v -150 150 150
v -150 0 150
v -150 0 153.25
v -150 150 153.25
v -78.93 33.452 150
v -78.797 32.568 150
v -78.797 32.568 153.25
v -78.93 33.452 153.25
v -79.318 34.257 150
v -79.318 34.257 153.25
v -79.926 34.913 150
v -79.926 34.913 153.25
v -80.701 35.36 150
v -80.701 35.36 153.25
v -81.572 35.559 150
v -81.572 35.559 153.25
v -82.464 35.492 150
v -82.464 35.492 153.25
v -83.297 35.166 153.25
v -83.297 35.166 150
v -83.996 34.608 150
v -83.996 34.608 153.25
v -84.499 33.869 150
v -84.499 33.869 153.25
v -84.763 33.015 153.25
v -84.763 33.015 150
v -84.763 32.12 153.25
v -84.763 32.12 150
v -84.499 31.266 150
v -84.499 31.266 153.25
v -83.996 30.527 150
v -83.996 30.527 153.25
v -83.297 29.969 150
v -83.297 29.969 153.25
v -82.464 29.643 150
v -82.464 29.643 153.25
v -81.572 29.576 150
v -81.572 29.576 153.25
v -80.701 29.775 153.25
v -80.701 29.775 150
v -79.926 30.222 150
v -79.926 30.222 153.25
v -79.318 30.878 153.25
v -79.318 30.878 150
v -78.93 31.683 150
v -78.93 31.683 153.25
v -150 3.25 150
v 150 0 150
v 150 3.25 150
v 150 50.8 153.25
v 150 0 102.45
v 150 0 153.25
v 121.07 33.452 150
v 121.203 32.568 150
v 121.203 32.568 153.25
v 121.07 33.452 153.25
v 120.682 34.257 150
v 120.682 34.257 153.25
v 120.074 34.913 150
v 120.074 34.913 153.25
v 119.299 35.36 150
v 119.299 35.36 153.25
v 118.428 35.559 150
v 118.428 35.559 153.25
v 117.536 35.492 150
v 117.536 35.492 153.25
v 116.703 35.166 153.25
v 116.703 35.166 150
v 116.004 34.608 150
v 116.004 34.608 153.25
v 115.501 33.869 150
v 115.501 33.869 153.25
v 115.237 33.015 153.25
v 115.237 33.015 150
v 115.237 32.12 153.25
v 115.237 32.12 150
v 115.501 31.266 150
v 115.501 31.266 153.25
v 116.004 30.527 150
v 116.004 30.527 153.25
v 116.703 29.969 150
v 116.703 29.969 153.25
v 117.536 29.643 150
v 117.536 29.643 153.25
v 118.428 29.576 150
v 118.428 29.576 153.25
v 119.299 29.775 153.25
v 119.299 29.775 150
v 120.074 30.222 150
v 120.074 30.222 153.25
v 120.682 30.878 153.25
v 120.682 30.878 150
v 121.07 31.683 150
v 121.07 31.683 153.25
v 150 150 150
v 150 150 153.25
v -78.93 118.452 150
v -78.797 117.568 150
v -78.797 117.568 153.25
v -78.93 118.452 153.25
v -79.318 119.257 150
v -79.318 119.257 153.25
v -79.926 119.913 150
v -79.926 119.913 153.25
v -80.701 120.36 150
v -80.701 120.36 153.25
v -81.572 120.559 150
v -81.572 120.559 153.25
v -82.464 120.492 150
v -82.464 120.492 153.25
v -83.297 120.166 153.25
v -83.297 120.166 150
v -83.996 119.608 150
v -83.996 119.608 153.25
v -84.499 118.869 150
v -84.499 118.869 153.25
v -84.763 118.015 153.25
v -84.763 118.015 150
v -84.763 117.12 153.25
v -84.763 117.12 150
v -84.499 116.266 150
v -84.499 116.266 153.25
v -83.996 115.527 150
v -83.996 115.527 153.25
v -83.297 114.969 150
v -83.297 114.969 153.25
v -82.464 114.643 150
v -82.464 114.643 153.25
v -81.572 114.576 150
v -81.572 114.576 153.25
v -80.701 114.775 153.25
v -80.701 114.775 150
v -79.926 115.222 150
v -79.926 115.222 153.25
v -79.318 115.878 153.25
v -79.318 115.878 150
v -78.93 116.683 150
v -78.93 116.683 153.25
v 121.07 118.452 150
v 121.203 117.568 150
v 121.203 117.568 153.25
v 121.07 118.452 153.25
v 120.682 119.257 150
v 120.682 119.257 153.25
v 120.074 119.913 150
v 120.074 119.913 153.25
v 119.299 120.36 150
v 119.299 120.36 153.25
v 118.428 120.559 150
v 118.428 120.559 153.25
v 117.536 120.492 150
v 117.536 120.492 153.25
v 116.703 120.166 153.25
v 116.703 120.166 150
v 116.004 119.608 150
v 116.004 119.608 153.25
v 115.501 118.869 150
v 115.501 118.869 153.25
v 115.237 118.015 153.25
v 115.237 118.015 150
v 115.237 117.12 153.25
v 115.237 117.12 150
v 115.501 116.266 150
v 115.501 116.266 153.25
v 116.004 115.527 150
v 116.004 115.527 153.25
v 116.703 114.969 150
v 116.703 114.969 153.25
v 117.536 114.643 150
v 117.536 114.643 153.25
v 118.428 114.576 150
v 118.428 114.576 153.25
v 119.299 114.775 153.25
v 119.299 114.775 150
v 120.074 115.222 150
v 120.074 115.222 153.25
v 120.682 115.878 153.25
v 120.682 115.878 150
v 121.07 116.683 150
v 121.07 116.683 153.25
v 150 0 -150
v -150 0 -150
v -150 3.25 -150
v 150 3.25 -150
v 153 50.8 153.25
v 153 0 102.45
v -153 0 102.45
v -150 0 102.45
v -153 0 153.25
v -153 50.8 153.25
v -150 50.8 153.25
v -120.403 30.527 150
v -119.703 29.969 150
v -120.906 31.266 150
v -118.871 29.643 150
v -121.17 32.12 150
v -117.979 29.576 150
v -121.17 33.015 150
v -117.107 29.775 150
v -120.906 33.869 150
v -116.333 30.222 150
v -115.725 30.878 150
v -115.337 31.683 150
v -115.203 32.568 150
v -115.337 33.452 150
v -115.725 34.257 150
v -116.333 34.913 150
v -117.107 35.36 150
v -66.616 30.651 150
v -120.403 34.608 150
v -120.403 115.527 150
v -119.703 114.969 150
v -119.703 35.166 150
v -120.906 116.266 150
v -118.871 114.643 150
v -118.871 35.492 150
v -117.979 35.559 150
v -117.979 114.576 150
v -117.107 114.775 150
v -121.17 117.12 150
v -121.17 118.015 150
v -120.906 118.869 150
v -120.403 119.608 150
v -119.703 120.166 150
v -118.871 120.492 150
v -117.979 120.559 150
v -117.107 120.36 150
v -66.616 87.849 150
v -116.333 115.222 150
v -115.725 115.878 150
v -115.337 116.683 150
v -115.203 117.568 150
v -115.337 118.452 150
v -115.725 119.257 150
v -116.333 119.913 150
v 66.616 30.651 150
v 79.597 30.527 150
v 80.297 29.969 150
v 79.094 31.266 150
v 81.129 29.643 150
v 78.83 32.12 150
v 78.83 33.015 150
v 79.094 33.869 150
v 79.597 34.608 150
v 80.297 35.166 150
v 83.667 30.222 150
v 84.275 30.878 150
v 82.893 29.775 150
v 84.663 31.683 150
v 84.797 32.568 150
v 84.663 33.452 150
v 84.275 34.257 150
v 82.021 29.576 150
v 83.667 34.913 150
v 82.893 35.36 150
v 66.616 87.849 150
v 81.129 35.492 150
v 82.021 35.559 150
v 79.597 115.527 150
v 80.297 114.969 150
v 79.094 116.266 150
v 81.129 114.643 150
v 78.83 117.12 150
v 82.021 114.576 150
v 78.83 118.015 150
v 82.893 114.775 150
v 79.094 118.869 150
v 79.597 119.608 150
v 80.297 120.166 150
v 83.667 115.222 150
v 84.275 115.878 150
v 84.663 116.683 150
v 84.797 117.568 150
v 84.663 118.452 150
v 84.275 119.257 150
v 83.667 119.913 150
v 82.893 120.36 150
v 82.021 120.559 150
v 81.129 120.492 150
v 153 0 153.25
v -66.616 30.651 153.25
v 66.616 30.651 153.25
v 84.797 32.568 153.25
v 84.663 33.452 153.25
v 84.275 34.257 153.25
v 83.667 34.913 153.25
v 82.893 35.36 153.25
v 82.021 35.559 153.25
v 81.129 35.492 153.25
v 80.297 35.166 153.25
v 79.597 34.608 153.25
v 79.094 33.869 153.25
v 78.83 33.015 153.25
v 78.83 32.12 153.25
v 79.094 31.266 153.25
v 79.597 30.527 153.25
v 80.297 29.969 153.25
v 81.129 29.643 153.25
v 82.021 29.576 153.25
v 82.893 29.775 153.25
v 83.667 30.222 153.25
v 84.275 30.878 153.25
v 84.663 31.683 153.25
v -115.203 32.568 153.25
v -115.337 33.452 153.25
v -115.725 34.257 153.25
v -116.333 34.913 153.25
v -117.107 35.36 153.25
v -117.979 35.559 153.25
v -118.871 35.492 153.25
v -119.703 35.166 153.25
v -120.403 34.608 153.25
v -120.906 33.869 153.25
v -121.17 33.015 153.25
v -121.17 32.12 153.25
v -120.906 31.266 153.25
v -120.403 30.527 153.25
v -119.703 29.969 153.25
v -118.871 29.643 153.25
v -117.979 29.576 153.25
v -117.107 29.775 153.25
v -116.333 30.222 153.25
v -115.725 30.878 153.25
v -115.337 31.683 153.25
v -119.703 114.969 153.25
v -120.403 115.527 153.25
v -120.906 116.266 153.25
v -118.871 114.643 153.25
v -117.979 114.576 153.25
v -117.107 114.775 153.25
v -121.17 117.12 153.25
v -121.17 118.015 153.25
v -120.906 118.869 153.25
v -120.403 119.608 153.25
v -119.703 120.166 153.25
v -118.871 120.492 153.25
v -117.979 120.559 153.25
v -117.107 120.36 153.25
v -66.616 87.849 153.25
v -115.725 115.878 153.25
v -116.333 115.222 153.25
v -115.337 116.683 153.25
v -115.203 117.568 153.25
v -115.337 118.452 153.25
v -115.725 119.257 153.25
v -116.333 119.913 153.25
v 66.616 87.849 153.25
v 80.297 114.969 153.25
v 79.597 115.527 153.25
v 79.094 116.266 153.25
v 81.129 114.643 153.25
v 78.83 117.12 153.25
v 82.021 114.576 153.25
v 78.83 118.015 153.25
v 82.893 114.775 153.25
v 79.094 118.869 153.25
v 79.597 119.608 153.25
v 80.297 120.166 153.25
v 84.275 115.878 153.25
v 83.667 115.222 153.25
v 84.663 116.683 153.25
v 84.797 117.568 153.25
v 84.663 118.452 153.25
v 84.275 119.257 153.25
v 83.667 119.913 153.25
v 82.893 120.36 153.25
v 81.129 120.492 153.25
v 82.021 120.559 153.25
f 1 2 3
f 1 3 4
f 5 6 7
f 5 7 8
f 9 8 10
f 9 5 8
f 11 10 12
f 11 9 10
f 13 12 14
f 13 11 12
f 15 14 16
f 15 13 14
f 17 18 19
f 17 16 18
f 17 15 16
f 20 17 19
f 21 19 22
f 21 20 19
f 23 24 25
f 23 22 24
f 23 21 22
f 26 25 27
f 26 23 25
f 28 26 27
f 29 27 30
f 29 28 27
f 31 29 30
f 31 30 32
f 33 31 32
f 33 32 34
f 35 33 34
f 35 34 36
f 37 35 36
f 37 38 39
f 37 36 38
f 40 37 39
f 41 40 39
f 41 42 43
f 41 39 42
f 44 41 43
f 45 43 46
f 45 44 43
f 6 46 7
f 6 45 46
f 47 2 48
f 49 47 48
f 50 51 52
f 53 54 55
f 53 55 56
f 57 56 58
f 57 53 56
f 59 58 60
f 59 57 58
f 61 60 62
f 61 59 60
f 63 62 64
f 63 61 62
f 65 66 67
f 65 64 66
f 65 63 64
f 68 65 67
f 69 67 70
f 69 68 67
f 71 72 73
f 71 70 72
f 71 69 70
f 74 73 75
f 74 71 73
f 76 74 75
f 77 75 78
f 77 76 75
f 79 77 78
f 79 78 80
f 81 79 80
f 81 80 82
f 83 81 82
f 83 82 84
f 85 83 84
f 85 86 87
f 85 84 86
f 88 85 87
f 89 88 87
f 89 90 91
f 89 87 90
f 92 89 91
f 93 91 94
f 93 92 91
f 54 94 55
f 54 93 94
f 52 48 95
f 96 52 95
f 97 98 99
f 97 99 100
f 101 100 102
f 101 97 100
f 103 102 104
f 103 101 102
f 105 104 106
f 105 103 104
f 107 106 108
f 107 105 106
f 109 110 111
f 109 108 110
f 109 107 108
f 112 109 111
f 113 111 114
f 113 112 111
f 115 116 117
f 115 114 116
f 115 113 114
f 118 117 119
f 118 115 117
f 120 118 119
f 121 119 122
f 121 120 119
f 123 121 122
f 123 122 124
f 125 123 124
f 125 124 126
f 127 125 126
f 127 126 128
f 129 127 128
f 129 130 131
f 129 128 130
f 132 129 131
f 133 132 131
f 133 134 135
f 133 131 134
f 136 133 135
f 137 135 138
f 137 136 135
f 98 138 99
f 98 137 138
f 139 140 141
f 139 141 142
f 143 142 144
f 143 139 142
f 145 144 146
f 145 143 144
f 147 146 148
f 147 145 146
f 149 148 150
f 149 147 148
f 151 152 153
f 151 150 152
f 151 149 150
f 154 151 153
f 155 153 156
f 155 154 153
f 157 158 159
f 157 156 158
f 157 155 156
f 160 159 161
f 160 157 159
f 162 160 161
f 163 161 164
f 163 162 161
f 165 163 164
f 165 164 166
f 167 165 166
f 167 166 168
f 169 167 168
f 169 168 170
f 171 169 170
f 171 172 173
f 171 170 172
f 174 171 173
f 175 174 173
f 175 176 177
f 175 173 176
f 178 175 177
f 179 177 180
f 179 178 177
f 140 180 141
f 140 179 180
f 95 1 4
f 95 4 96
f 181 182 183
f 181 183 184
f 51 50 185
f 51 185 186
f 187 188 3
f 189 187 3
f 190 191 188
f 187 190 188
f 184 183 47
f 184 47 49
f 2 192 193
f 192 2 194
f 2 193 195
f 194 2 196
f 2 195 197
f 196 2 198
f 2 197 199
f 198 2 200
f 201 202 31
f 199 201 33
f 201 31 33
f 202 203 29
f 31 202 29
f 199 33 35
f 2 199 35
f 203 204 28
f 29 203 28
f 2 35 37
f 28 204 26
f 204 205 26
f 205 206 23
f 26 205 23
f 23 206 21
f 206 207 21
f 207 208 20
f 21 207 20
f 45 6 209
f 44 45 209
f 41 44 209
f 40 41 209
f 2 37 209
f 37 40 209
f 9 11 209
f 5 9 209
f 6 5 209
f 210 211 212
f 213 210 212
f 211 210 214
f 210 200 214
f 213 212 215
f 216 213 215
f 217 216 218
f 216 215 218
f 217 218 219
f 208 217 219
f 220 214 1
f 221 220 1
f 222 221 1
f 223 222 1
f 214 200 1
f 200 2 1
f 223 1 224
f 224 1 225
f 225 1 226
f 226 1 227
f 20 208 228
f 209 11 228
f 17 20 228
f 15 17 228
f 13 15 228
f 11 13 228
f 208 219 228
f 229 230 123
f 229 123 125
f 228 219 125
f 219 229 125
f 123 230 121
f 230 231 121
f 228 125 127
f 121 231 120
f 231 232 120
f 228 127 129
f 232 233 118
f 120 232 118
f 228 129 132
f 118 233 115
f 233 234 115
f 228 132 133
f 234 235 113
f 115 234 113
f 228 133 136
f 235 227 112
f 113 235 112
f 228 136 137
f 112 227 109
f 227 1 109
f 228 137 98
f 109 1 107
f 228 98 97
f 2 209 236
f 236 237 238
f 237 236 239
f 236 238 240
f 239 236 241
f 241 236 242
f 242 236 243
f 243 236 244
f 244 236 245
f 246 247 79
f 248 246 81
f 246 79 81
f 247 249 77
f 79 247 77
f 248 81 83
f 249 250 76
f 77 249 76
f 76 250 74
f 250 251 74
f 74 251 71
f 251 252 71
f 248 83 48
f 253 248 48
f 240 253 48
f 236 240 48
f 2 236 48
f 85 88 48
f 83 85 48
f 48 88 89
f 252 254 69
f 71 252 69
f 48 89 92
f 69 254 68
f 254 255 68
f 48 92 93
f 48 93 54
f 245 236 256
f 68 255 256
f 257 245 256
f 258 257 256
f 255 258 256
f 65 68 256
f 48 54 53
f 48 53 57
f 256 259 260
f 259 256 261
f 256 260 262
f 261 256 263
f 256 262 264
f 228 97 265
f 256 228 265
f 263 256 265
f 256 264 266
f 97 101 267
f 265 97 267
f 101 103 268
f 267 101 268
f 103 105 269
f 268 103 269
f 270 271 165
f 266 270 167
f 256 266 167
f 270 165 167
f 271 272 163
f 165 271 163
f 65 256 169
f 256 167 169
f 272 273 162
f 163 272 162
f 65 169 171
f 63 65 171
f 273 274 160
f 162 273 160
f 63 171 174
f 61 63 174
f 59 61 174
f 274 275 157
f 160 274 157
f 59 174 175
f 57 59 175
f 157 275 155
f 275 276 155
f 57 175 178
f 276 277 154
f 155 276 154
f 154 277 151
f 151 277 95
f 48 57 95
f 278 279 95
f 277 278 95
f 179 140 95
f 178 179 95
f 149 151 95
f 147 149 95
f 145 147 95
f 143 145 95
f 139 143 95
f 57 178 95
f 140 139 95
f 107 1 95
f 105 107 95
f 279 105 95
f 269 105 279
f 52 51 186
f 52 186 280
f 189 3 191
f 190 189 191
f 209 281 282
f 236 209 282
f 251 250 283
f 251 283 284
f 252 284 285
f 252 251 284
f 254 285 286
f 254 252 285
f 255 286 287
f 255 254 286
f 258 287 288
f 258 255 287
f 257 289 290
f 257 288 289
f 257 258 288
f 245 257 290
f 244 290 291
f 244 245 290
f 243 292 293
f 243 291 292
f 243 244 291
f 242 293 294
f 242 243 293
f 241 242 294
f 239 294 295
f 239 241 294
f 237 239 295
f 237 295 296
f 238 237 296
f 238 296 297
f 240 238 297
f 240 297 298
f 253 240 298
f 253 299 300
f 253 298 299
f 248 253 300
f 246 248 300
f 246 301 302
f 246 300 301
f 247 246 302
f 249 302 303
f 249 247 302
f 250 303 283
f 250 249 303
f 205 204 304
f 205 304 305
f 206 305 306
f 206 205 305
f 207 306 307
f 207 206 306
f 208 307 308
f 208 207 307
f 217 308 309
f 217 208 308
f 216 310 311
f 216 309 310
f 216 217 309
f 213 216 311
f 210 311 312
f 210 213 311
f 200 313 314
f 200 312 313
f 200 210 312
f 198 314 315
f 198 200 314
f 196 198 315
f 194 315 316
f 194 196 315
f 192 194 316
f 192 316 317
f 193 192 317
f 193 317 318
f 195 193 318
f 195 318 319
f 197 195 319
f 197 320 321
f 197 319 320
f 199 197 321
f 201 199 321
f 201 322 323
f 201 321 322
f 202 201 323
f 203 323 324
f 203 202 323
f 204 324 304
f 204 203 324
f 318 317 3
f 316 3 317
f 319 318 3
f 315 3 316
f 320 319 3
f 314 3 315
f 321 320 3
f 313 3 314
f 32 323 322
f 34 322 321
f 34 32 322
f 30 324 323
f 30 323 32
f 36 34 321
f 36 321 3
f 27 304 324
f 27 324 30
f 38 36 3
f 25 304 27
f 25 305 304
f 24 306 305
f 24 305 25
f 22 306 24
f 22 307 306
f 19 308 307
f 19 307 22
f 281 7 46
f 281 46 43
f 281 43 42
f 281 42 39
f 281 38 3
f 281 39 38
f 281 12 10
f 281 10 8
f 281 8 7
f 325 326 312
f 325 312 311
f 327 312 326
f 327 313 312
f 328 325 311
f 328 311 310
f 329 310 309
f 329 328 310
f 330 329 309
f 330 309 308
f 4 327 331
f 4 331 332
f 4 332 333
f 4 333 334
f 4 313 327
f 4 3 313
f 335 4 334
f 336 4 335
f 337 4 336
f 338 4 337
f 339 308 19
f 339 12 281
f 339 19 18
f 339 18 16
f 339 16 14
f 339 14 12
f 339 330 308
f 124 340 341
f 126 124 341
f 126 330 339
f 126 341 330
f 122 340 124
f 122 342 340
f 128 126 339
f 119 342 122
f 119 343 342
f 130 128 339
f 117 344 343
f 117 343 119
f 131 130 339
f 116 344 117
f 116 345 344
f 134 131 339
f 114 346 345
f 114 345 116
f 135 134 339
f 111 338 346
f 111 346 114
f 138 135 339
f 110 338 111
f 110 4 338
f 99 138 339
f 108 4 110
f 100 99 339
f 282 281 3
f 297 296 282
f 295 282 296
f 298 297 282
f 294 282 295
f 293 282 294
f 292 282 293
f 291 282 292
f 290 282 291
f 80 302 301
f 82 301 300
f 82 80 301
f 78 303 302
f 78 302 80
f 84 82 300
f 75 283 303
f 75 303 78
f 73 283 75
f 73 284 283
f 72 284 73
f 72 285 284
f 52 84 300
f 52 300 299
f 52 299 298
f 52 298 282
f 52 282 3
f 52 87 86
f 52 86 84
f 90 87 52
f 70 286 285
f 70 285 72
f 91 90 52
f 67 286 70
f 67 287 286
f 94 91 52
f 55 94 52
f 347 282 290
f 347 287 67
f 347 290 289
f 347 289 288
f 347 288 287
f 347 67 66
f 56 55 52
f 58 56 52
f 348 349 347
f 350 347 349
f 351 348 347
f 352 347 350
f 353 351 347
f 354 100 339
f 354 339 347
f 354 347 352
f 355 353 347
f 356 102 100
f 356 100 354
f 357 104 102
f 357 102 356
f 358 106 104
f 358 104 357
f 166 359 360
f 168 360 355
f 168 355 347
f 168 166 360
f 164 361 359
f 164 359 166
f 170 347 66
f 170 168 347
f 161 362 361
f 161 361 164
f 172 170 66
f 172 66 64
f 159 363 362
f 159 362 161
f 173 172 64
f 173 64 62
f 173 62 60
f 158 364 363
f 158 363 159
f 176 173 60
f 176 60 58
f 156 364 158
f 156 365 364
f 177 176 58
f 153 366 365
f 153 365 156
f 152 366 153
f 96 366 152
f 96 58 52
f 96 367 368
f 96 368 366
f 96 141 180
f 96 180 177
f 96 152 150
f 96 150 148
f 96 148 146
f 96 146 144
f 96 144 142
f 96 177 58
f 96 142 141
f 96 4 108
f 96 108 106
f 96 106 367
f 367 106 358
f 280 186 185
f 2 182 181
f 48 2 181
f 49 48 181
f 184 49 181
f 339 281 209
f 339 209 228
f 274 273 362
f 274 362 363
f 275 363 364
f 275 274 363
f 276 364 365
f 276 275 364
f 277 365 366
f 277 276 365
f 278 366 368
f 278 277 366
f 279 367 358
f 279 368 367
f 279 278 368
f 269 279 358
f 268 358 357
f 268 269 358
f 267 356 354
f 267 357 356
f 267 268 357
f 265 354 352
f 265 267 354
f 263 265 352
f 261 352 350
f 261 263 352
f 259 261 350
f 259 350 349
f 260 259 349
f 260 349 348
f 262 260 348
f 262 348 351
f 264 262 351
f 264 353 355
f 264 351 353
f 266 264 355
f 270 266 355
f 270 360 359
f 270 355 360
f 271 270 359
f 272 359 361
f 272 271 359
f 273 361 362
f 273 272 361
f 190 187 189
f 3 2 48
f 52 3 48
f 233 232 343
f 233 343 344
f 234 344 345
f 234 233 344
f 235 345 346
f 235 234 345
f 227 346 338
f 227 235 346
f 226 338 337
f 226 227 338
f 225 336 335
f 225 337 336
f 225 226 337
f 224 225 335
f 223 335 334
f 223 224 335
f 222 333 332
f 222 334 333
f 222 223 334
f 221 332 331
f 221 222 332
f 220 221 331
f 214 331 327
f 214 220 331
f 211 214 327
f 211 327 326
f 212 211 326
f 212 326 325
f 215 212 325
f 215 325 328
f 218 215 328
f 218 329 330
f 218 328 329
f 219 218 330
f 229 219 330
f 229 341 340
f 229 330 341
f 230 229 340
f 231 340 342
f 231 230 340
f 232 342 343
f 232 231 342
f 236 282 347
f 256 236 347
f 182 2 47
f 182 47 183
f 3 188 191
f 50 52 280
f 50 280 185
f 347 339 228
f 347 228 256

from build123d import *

# Parameters (mm, degrees)
SKETCH1_W           = 300
SKETCH1_H           = 300
BOSS_EXTRUDE1_DEPTH = 3.25
SKETCH2_W           = 300
SKETCH2_H           = 150
BOSS_EXTRUDE2_DEPTH = 3.25
SKETCH3_W           = 133.232581151
SKETCH3_H           = 57.198779066
CUT_EXTRUDE1_DEPTH  = 3.25
SKETCH4_R           = 3
CUT_EXTRUDE2_DEPTH  = 21.75
BOSS_EXTRUDE3_DEPTH = 3


with BuildPart() as part:
    # Sketch1 → Boss-Extrude1 (new body)
    with BuildSketch(Plane(origin=(0, 0, 0), x_dir=(1, 0, 0), z_dir=(0, 1, 0))):
        Rectangle(SKETCH1_W, SKETCH1_H)
    extrude(amount=BOSS_EXTRUDE1_DEPTH)


with BuildPart() as body_2:
    # Sketch2 → Boss-Extrude2 (new body)
    with BuildSketch(Plane.XY.offset(150)):
        with Locations((0, 75)):
            Rectangle(SKETCH2_W, SKETCH2_H)
    extrude(amount=BOSS_EXTRUDE2_DEPTH)

    # Sketch3 → Cut-Extrude1 (cut)
    with BuildSketch(Plane.XY.offset(153.25)):
        with Locations((-1e-09, 59.249991748)):
            Rectangle(SKETCH3_W, SKETCH3_H)
    extrude(amount=-CUT_EXTRUDE1_DEPTH, mode=Mode.SUBTRACT)

    # Sketch4 → Cut-Extrude2 (cut, through all)
    with BuildSketch(Plane.XY.offset(132.5)):
        with Locations((81.79658804, 117.567539588)):
            Circle(SKETCH4_R)
        with Locations((118.20341196, 117.567539588)):
            Circle(SKETCH4_R)
        with Locations((118.20341196, 32.567539588)):
            Circle(SKETCH4_R)
        with Locations((81.79658804, 32.567539588)):
            Circle(SKETCH4_R)
        with Locations((-81.79658804, 32.567539588)):
            Circle(SKETCH4_R)
        with Locations((-118.20341196, 32.567539588)):
            Circle(SKETCH4_R)
        with Locations((-118.20341196, 117.567539588)):
            Circle(SKETCH4_R)
        with Locations((-81.79658804, 117.567539588)):
            Circle(SKETCH4_R)
    extrude(amount=CUT_EXTRUDE2_DEPTH, mode=Mode.SUBTRACT)


with BuildPart() as body_3:
    # Sketch5 → Boss-Extrude3 (new body)
    with BuildSketch(Plane(origin=(150, 0, 0), x_dir=(0, 0, -1), z_dir=(1, 0, 0))):
        Polygon((-153.25, 0), (-153.25, 50.8), (-102.45, 0), align=None)
    extrude(amount=BOSS_EXTRUDE3_DEPTH)


with BuildPart() as body_4:
    # Mirror1: mirrored copy
    add(body_3.part.mirror(Plane(origin=(0, 0, 0), x_dir=(0, 0, 1), z_dir=(1, 0, 0))))


solid = Compound([part.part, body_2.part, body_3.part, body_4.part])
